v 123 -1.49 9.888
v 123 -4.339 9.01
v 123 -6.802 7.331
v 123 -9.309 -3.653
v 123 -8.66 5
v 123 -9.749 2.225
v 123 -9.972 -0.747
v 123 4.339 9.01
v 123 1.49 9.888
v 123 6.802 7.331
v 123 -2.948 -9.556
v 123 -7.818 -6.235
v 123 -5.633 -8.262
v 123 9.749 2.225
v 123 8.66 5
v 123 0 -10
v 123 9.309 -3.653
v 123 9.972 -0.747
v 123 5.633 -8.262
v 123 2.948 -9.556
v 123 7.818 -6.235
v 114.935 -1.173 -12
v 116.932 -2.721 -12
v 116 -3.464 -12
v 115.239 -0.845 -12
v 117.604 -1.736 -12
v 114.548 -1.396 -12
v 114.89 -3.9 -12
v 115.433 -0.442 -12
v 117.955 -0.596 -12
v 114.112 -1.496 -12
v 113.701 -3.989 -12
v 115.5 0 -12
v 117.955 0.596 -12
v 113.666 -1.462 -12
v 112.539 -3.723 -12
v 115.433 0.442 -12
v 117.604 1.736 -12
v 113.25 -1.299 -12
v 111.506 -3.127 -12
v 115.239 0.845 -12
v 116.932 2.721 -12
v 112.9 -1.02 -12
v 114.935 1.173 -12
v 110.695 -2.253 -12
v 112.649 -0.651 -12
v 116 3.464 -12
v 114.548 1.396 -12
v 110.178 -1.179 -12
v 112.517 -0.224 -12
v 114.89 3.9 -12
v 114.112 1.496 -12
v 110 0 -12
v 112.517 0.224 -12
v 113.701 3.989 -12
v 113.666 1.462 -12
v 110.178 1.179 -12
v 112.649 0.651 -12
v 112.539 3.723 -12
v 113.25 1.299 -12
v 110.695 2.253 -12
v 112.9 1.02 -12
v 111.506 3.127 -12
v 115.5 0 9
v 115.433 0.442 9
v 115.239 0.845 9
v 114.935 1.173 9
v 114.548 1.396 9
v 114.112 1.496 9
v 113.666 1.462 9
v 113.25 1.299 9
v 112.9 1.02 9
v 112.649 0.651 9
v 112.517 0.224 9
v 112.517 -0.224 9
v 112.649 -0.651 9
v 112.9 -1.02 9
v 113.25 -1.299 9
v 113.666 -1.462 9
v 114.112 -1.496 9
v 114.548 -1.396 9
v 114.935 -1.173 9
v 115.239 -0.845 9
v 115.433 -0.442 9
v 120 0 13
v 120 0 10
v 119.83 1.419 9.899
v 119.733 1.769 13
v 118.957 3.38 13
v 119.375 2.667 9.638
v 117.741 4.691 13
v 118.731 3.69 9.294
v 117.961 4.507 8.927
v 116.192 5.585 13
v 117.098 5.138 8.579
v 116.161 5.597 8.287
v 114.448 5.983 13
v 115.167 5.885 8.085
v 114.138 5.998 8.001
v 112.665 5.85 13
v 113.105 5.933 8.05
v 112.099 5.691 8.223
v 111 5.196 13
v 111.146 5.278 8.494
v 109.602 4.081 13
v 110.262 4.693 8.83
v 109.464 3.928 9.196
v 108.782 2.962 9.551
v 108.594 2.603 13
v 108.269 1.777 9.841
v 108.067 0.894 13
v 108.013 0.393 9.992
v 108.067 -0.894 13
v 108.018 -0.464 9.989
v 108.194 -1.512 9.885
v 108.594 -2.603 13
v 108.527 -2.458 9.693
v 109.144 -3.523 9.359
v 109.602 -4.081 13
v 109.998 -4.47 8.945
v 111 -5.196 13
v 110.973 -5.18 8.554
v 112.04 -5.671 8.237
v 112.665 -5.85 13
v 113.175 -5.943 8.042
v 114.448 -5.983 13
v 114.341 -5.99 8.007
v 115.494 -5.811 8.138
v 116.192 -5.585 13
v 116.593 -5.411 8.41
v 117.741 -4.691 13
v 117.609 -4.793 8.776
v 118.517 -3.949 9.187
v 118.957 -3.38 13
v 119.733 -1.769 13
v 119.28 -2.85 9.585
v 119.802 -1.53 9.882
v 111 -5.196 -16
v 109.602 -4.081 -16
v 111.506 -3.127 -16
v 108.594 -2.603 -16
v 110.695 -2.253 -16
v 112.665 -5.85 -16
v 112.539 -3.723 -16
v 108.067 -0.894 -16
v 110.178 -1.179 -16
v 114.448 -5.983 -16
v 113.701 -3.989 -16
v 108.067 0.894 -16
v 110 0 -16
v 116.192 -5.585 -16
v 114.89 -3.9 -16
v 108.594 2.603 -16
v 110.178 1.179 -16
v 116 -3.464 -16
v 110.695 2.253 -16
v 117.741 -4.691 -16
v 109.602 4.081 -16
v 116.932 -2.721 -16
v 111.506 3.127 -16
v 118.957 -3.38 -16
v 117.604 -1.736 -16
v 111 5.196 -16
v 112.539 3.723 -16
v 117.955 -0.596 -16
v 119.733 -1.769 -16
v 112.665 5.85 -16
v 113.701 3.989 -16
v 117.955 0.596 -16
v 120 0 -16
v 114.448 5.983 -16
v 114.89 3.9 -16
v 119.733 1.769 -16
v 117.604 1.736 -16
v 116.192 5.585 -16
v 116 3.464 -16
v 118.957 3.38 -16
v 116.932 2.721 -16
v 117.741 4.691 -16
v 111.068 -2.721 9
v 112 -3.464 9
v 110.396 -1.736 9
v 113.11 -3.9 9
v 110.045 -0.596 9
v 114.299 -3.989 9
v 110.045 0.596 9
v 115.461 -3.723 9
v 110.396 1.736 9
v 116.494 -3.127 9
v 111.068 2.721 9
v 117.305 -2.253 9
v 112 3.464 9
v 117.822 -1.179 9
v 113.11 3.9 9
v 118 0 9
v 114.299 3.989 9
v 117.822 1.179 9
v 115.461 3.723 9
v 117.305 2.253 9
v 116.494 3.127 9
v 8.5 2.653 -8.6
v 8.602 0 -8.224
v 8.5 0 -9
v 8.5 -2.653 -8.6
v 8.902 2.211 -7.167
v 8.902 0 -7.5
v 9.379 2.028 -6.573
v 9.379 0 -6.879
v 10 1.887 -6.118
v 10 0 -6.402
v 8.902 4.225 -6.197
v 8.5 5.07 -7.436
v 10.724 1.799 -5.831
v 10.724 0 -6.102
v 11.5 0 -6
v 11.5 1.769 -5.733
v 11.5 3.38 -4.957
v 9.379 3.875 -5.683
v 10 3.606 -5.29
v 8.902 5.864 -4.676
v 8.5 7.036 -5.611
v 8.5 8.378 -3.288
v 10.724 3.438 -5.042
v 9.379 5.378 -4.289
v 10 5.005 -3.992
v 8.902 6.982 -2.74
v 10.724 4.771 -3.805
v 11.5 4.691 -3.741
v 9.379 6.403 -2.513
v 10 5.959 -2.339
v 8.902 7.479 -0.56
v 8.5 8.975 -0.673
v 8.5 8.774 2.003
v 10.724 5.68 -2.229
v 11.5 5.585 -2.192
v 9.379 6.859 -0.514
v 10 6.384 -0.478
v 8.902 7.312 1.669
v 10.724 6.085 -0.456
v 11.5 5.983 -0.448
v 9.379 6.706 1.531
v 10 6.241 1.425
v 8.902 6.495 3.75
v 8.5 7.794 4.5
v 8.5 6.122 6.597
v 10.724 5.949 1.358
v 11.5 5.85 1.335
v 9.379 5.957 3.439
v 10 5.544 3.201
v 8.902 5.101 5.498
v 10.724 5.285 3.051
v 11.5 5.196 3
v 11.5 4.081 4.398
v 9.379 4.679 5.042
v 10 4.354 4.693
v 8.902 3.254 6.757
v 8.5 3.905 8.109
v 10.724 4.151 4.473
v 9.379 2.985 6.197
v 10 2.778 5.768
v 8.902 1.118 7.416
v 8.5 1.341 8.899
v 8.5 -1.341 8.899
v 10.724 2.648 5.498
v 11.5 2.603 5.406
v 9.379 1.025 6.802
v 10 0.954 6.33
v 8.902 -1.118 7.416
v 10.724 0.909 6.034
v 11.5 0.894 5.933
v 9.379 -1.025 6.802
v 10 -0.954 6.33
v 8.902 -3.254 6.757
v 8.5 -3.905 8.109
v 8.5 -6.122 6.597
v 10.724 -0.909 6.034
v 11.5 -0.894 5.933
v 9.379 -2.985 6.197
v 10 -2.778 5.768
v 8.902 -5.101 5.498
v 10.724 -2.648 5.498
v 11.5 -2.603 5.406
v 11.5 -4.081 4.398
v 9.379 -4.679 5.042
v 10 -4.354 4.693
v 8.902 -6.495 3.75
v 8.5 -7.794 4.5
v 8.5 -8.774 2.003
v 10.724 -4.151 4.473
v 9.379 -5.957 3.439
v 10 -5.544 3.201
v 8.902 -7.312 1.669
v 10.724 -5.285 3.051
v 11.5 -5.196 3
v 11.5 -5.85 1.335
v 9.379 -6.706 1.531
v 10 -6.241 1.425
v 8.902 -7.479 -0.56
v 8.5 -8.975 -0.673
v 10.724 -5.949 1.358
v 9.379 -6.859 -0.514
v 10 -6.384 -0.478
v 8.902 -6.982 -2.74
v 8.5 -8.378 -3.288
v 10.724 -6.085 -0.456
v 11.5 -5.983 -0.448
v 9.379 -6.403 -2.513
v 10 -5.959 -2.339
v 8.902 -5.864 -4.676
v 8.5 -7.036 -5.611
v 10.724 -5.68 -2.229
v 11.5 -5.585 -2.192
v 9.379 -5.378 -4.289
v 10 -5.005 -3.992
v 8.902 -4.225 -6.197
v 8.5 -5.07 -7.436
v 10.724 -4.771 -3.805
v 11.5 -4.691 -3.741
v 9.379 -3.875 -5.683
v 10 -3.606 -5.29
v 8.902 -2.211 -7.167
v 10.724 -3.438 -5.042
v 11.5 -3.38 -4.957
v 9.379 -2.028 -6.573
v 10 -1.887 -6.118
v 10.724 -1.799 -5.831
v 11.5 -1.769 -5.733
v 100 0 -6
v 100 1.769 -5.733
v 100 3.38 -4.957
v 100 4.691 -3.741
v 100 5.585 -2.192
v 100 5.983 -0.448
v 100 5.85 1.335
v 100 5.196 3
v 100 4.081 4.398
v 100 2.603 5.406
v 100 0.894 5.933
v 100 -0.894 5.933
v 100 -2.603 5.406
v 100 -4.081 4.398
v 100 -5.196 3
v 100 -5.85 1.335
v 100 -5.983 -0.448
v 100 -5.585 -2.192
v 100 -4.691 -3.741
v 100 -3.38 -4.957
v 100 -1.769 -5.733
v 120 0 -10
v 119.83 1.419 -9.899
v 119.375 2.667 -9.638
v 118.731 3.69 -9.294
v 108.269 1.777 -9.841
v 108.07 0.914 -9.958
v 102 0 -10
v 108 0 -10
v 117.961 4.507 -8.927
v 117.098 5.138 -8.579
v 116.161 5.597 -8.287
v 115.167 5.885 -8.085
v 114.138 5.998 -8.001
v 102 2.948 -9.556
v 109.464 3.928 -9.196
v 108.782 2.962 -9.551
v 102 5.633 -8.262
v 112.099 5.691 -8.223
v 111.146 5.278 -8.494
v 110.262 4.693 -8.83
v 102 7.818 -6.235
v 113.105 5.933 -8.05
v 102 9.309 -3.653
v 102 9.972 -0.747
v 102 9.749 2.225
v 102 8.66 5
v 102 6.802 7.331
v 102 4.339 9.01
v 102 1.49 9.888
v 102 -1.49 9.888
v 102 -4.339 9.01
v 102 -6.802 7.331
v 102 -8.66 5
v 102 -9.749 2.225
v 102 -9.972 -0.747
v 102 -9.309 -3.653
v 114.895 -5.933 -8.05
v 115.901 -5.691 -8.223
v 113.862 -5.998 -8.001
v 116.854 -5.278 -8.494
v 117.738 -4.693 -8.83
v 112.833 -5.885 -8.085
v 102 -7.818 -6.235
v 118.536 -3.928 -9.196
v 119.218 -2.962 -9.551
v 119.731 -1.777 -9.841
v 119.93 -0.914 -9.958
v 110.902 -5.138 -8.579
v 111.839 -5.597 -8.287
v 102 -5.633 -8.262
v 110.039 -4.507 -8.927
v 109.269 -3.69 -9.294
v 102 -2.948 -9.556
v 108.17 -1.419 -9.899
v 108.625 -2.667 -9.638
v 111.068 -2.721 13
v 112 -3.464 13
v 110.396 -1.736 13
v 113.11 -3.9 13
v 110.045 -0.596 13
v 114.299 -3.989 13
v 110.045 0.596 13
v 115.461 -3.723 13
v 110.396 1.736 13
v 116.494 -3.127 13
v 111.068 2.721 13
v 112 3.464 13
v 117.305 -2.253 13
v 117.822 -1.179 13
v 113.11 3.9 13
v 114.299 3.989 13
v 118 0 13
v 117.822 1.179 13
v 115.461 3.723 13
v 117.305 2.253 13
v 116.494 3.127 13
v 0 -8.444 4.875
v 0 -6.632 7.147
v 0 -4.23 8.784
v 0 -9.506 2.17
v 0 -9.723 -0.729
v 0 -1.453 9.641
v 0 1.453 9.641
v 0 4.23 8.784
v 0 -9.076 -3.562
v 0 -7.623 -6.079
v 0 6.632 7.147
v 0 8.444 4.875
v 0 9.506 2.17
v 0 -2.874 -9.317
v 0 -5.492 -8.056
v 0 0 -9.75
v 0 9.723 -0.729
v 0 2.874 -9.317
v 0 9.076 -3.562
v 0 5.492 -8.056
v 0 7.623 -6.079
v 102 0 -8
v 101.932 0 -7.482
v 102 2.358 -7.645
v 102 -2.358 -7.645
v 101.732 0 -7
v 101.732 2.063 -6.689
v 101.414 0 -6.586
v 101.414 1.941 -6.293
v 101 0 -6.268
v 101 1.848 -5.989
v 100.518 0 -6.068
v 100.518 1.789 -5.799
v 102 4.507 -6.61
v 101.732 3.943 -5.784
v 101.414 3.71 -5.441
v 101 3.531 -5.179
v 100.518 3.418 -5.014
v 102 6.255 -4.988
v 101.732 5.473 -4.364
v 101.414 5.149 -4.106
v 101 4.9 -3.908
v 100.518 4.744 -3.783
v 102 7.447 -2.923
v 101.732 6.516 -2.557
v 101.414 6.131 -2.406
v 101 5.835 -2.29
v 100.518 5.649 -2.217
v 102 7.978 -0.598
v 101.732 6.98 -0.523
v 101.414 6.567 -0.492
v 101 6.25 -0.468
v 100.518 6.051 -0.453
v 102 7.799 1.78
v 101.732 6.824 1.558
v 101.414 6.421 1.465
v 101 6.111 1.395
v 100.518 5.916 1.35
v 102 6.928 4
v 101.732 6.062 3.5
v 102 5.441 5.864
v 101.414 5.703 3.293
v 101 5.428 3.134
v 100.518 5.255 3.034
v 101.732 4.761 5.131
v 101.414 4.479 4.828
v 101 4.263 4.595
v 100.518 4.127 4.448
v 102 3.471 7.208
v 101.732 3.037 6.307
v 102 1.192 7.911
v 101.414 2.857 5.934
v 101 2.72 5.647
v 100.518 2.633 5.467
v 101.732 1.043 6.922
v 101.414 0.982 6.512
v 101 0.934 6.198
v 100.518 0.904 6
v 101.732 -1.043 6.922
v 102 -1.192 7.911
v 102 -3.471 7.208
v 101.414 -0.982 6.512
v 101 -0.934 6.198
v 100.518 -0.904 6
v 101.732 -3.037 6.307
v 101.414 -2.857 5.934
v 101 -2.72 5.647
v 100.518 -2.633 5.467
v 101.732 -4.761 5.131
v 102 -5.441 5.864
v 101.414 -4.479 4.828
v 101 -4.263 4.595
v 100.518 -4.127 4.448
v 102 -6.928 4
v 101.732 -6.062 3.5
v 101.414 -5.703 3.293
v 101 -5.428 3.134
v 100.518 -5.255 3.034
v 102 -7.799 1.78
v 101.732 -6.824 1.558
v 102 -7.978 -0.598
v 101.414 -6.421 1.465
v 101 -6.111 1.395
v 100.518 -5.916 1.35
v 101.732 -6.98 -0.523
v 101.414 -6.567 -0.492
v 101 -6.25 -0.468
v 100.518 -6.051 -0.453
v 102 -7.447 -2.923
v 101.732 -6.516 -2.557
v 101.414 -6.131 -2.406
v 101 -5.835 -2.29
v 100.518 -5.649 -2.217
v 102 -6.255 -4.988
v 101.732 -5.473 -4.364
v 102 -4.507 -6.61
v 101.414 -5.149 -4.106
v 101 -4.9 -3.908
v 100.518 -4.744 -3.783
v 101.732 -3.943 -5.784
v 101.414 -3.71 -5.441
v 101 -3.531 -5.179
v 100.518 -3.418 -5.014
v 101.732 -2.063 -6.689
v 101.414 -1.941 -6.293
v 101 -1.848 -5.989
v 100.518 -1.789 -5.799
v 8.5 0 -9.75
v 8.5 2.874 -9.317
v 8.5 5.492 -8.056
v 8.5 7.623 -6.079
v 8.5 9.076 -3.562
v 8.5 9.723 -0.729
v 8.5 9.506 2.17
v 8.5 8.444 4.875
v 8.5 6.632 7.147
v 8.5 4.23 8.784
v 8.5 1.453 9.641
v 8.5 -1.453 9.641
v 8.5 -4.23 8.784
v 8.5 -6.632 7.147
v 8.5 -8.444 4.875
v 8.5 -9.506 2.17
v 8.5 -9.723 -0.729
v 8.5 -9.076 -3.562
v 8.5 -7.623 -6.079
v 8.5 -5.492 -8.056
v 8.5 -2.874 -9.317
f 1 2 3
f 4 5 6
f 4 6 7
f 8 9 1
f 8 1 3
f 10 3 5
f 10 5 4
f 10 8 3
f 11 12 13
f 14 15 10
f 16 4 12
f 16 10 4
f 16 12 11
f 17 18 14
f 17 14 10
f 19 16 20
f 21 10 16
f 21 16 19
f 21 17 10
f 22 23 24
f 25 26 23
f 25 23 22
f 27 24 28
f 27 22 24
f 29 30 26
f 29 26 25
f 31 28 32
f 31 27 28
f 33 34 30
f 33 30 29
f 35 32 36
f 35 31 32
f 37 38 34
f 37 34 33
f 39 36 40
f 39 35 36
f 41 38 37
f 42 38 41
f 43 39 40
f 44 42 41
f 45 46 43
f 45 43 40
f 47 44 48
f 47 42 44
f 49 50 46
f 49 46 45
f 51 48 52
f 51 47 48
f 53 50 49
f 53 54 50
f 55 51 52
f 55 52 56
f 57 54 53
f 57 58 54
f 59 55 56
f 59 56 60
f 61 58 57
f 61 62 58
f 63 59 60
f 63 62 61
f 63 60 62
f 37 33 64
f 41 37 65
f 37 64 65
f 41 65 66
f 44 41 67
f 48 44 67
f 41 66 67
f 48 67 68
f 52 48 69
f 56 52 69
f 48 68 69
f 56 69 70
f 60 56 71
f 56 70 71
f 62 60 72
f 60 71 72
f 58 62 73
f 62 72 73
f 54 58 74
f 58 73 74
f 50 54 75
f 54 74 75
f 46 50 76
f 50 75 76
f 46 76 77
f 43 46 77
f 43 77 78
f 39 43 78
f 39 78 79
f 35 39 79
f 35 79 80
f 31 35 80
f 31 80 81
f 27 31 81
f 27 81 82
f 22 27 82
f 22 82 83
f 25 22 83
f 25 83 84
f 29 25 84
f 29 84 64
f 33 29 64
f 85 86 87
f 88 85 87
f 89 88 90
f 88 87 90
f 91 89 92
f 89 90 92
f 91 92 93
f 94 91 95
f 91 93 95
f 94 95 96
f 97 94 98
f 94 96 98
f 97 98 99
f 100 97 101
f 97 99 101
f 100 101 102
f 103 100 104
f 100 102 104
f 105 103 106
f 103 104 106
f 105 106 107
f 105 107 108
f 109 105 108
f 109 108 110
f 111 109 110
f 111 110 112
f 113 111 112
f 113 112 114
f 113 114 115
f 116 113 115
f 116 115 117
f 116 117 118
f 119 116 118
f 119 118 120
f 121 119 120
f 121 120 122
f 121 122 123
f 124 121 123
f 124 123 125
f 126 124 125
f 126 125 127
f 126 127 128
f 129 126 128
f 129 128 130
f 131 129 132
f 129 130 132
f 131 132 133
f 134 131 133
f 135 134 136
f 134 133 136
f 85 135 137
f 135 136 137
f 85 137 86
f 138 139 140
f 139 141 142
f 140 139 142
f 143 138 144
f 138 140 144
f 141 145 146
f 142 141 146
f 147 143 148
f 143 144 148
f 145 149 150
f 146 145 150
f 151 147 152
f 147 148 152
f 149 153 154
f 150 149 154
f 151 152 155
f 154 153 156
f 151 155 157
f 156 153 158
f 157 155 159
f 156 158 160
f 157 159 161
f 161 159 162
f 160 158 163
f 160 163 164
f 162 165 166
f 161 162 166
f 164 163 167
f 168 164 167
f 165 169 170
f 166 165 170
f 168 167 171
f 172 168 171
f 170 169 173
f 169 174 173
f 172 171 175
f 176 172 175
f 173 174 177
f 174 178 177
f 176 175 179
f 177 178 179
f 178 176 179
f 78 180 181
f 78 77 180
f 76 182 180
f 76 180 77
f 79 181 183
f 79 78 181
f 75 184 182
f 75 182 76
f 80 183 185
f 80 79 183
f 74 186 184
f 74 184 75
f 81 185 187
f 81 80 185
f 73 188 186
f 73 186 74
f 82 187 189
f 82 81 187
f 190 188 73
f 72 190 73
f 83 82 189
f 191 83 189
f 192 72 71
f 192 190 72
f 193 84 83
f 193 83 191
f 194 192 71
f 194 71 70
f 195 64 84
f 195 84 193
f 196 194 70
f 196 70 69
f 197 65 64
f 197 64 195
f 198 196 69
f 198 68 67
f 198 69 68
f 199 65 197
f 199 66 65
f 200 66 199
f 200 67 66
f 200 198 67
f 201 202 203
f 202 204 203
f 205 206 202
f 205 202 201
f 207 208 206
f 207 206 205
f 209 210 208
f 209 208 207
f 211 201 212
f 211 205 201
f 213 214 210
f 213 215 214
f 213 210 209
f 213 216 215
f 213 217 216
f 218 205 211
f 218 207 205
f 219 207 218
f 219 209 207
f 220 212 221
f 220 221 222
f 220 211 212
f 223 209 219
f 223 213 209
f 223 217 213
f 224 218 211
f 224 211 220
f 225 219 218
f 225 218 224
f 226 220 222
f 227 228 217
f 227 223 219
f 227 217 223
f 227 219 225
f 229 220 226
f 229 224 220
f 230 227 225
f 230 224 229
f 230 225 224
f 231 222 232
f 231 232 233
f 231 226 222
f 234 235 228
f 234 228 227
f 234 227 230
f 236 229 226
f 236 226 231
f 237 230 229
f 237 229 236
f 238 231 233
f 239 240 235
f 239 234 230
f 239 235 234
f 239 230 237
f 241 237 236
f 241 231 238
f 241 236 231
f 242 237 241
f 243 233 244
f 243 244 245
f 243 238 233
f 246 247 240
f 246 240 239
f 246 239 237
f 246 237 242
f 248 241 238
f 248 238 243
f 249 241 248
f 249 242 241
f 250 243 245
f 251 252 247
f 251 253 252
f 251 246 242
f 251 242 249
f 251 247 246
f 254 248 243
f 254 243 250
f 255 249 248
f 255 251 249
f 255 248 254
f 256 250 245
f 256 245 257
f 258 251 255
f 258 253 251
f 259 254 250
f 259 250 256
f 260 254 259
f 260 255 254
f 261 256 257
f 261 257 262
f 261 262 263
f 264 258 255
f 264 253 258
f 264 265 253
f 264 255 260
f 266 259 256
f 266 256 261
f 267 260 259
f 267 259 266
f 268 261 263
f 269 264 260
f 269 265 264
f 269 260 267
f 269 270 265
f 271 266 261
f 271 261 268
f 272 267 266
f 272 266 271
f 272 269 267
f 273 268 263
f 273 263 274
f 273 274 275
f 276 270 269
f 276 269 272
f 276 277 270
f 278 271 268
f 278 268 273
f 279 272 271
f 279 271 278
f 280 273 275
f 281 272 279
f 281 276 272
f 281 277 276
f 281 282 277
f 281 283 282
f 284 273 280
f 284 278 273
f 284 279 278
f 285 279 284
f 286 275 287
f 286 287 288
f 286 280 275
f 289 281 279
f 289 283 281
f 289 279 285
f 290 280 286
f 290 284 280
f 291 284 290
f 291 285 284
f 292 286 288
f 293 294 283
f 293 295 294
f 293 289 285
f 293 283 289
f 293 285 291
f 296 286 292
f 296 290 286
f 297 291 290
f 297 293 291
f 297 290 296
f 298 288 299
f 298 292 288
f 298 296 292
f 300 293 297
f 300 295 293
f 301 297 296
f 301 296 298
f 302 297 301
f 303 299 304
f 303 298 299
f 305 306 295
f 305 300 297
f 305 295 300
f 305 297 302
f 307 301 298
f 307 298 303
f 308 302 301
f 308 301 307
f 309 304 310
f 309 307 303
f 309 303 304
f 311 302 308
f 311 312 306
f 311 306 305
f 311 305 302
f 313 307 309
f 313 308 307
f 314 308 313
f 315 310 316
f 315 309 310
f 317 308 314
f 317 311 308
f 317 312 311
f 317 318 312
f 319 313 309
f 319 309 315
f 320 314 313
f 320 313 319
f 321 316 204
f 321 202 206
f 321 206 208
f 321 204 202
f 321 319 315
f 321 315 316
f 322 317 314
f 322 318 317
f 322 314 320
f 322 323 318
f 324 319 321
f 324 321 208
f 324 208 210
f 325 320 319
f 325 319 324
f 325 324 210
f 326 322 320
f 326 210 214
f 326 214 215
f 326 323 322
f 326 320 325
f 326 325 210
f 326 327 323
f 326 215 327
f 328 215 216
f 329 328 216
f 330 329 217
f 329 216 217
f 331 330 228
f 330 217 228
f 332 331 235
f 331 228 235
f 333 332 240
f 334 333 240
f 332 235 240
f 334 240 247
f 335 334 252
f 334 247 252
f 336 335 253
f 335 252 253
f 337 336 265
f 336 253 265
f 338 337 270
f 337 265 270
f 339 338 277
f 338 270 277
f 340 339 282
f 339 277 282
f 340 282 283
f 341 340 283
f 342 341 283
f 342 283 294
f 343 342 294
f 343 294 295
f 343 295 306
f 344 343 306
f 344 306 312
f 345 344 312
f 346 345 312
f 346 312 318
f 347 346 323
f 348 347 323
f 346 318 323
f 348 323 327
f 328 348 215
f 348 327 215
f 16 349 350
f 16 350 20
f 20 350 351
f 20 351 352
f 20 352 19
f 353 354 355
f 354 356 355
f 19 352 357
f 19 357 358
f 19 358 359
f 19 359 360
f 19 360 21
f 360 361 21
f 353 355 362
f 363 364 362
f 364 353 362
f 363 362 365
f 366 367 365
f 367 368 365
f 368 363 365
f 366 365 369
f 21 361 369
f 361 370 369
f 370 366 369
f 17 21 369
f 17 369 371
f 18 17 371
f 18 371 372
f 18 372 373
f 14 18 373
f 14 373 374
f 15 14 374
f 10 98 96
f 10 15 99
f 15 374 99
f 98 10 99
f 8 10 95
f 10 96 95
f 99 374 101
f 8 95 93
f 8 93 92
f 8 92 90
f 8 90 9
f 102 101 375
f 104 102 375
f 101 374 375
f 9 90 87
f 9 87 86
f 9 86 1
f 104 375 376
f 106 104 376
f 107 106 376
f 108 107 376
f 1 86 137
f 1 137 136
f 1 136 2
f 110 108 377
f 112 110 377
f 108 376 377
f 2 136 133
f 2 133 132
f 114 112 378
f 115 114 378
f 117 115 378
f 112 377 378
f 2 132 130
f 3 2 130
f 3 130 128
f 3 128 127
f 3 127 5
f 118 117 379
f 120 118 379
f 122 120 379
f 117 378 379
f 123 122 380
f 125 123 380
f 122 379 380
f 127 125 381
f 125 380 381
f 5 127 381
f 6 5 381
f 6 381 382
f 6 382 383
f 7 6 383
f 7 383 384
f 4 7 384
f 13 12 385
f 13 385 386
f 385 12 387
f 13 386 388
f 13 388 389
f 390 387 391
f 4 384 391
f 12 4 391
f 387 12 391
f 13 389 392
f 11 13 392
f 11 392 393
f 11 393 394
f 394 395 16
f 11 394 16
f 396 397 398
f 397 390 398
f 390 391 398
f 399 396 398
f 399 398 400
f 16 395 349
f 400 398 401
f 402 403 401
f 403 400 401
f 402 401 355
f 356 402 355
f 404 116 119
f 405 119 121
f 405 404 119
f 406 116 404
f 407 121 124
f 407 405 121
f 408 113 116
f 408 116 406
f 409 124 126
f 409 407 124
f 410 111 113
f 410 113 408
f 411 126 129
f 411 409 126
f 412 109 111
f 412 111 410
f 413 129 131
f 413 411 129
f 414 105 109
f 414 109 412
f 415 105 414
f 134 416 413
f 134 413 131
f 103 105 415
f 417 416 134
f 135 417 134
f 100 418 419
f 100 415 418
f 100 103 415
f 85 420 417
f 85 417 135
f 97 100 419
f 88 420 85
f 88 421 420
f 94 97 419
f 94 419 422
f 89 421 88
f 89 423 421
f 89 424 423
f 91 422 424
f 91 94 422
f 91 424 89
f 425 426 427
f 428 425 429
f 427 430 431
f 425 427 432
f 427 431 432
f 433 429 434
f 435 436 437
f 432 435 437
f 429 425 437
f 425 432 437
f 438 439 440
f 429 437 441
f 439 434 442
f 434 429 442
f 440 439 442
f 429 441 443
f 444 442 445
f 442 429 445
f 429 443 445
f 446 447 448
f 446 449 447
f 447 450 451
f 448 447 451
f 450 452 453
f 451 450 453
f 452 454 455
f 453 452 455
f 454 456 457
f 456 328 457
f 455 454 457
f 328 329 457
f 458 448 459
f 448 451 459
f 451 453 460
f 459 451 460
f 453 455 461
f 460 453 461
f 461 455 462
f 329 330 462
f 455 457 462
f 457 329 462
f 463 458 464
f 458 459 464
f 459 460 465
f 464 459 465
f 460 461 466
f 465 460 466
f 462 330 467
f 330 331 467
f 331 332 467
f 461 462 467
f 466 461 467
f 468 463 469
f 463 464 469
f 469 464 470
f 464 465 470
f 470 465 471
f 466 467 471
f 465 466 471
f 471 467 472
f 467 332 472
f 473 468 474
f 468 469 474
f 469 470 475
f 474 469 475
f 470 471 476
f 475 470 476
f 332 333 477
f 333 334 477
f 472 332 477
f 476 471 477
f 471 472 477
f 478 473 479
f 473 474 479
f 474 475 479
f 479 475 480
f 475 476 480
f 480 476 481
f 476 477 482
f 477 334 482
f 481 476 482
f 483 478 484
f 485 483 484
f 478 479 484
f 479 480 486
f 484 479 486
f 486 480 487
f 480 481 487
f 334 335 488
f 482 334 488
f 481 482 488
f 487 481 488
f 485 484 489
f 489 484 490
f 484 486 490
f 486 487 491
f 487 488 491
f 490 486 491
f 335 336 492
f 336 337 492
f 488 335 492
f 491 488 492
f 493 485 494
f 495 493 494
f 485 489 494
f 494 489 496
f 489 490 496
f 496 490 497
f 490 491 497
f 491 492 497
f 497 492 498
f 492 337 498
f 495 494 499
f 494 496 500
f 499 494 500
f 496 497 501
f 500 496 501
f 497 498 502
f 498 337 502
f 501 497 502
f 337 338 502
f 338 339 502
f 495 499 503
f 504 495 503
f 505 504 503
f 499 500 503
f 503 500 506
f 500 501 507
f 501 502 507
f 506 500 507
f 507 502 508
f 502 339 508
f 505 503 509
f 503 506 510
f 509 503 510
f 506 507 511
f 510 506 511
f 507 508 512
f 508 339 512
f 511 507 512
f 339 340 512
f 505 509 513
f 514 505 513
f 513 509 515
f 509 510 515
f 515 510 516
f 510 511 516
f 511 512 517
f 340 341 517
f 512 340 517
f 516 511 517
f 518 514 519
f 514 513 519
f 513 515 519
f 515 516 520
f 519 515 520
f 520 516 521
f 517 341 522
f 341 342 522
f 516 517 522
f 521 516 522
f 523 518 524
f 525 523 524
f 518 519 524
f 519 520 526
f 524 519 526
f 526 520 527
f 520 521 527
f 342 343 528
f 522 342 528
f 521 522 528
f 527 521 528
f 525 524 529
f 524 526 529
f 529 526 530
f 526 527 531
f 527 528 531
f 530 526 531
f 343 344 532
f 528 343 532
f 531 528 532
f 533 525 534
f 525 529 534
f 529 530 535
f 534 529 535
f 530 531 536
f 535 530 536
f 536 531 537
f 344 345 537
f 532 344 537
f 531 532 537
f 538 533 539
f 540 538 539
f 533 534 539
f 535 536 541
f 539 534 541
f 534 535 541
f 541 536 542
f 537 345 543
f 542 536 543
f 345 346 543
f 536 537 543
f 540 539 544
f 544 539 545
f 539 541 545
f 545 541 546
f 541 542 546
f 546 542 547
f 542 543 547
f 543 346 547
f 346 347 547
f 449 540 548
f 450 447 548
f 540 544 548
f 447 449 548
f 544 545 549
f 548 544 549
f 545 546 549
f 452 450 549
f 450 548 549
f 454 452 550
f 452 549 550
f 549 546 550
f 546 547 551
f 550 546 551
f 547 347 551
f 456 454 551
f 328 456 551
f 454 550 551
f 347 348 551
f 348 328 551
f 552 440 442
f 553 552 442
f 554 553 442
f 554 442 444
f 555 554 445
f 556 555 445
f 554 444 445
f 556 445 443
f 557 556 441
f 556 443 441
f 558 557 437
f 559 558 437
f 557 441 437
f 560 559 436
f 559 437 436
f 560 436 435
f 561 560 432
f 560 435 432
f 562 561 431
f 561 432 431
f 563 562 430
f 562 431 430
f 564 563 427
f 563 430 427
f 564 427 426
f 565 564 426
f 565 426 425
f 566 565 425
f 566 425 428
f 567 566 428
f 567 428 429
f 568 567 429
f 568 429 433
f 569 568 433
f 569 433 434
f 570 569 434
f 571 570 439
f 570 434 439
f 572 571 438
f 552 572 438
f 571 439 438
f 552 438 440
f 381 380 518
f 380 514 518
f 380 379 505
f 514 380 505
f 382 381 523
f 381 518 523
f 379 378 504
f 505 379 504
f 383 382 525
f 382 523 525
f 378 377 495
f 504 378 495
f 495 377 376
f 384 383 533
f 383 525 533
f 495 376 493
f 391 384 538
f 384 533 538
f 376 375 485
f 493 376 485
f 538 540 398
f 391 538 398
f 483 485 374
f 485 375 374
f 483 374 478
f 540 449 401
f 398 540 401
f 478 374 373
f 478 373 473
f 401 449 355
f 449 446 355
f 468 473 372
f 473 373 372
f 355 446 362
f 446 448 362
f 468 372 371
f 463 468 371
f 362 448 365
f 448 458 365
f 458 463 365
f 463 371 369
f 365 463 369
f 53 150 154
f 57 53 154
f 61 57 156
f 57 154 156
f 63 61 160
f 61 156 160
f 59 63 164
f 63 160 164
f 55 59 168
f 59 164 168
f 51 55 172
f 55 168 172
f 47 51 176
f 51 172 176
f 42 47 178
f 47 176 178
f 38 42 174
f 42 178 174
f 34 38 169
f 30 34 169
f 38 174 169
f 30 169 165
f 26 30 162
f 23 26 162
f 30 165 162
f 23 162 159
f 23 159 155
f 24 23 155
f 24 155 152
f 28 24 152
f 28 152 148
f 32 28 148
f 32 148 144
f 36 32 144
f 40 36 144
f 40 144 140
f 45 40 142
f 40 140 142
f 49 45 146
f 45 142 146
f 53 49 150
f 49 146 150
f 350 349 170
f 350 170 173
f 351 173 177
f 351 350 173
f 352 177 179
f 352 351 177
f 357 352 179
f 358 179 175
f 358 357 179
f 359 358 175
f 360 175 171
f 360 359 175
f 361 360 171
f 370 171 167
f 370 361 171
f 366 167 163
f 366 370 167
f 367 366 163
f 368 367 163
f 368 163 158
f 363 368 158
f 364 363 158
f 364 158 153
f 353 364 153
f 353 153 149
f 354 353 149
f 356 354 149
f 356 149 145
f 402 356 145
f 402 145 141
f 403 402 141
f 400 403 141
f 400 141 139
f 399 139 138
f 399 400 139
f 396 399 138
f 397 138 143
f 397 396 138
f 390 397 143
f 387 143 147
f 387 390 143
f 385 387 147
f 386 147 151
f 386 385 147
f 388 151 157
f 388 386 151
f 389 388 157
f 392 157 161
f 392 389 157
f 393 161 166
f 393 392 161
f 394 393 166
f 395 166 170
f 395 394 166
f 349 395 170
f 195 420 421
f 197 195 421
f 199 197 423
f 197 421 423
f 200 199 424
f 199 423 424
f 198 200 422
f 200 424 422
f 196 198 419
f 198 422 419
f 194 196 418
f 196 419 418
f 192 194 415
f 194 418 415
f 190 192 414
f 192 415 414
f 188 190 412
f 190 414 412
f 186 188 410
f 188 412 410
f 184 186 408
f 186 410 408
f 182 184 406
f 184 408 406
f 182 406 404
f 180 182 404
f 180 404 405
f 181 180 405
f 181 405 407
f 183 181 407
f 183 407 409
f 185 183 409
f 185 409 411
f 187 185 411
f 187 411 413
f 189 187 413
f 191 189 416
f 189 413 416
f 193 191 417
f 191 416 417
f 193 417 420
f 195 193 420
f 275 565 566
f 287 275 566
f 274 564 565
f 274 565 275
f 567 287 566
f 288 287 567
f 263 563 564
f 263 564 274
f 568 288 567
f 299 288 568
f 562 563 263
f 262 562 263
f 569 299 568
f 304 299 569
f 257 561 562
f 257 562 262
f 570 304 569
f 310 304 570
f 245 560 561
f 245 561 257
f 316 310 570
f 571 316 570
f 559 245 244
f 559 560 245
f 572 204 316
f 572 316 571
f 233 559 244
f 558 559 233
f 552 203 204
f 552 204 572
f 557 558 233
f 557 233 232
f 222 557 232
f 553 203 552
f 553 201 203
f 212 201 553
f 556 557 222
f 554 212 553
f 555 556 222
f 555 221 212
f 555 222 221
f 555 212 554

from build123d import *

# Parameters (mm, degrees)
SKETCH2_R                = 9.75
BOSS_EXTRUDE1_DEPTH      = 8.5
SKETCH3_R                = 6
BOSS_EXTRUDE2_DEPTH      = 93.5
FILLET1_R                = 3
SKETCH4_R                = 10
BOSS_EXTRUDE3_DEPTH      = 21
FILLET2_R                = 2
SKETCH5_R                = 6
BOSS_EXTRUDE4_DEPTH      = 13
BOSS_EXTRUDE4_DEPTH_BACK = 16
SKETCH6_R                = 4
CUT_EXTRUDE1_DEPTH       = 4
CUT_EXTRUDE2_REACH       = 27
SKETCH7_R                = 1.5
SKETCH8_R                = 4
CUT_EXTRUDE3_DEPTH       = 4


with BuildPart() as part:
    # Sketch2 → Boss-Extrude1 (new body)
    with BuildSketch(Plane(origin=(0, 0, 0), x_dir=(0, 0, -1), z_dir=(1, 0, 0))):
        Circle(SKETCH2_R)
    extrude(amount=BOSS_EXTRUDE1_DEPTH)

    # Sketch3 → Boss-Extrude2 (add)
    with BuildSketch(Plane(origin=(8.5, 0, 0), x_dir=(0, 0, -1), z_dir=(1, 0, 0))):
        Circle(SKETCH3_R)
    extrude(amount=BOSS_EXTRUDE2_DEPTH)

    # Fillet1
    fillet1_edges = [part.edges().sort_by_distance(p)[0] for p in [
        (8.5, 0, 6),
    ]]
    fillet(fillet1_edges, radius=FILLET1_R)

    # Sketch4 → Boss-Extrude3 (add)
    with BuildSketch(Plane(origin=(102, 0, 0), x_dir=(0, 0, -1), z_dir=(1, 0, 0))):
        Circle(SKETCH4_R)
    extrude(amount=BOSS_EXTRUDE3_DEPTH)

    # Fillet2
    fillet2_edges = [part.edges().sort_by_distance(p)[0] for p in [
        (102, 0, 6),
    ]]
    fillet(fillet2_edges, radius=FILLET2_R)

    # Sketch5 → Boss-Extrude4 (add, two sides)
    with BuildSketch(Plane.XY) as boss_extrude4_sk:
        with Locations((114, 0)):
            Circle(SKETCH5_R)
    extrude(amount=BOSS_EXTRUDE4_DEPTH)
    extrude(boss_extrude4_sk.sketch, amount=-BOSS_EXTRUDE4_DEPTH_BACK)

    # Sketch6 → Cut-Extrude1 (cut)
    with BuildSketch(Plane.XY.offset(13)):
        with Locations((114, 0)):
            Circle(SKETCH6_R)
    extrude(amount=-CUT_EXTRUDE1_DEPTH, mode=Mode.SUBTRACT)

    # Sketch7 → Cut-Extrude2 (cut, up to next)
    with BuildSketch(Plane.XY.offset(9), mode=Mode.PRIVATE) as cut_extrude2_sk1:
        with Locations((114, 0)):
            Circle(SKETCH7_R)
    cut_extrude2_tool1 = extrude(cut_extrude2_sk1.sketch, amount=-CUT_EXTRUDE2_REACH, mode=Mode.PRIVATE) & part.part
    add(cut_extrude2_tool1.solids().sort_by_distance((114, 0, 9))[0], mode=Mode.SUBTRACT)

    # Sketch8 → Cut-Extrude3 (cut)
    with BuildSketch(Plane(origin=(0, 0, -16), x_dir=(-1, 0, 0), z_dir=(0, 0, -1))):
        with Locations((-114, 0)):
            Circle(SKETCH8_R)
    extrude(amount=-CUT_EXTRUDE3_DEPTH, mode=Mode.SUBTRACT)


solid = part.part
